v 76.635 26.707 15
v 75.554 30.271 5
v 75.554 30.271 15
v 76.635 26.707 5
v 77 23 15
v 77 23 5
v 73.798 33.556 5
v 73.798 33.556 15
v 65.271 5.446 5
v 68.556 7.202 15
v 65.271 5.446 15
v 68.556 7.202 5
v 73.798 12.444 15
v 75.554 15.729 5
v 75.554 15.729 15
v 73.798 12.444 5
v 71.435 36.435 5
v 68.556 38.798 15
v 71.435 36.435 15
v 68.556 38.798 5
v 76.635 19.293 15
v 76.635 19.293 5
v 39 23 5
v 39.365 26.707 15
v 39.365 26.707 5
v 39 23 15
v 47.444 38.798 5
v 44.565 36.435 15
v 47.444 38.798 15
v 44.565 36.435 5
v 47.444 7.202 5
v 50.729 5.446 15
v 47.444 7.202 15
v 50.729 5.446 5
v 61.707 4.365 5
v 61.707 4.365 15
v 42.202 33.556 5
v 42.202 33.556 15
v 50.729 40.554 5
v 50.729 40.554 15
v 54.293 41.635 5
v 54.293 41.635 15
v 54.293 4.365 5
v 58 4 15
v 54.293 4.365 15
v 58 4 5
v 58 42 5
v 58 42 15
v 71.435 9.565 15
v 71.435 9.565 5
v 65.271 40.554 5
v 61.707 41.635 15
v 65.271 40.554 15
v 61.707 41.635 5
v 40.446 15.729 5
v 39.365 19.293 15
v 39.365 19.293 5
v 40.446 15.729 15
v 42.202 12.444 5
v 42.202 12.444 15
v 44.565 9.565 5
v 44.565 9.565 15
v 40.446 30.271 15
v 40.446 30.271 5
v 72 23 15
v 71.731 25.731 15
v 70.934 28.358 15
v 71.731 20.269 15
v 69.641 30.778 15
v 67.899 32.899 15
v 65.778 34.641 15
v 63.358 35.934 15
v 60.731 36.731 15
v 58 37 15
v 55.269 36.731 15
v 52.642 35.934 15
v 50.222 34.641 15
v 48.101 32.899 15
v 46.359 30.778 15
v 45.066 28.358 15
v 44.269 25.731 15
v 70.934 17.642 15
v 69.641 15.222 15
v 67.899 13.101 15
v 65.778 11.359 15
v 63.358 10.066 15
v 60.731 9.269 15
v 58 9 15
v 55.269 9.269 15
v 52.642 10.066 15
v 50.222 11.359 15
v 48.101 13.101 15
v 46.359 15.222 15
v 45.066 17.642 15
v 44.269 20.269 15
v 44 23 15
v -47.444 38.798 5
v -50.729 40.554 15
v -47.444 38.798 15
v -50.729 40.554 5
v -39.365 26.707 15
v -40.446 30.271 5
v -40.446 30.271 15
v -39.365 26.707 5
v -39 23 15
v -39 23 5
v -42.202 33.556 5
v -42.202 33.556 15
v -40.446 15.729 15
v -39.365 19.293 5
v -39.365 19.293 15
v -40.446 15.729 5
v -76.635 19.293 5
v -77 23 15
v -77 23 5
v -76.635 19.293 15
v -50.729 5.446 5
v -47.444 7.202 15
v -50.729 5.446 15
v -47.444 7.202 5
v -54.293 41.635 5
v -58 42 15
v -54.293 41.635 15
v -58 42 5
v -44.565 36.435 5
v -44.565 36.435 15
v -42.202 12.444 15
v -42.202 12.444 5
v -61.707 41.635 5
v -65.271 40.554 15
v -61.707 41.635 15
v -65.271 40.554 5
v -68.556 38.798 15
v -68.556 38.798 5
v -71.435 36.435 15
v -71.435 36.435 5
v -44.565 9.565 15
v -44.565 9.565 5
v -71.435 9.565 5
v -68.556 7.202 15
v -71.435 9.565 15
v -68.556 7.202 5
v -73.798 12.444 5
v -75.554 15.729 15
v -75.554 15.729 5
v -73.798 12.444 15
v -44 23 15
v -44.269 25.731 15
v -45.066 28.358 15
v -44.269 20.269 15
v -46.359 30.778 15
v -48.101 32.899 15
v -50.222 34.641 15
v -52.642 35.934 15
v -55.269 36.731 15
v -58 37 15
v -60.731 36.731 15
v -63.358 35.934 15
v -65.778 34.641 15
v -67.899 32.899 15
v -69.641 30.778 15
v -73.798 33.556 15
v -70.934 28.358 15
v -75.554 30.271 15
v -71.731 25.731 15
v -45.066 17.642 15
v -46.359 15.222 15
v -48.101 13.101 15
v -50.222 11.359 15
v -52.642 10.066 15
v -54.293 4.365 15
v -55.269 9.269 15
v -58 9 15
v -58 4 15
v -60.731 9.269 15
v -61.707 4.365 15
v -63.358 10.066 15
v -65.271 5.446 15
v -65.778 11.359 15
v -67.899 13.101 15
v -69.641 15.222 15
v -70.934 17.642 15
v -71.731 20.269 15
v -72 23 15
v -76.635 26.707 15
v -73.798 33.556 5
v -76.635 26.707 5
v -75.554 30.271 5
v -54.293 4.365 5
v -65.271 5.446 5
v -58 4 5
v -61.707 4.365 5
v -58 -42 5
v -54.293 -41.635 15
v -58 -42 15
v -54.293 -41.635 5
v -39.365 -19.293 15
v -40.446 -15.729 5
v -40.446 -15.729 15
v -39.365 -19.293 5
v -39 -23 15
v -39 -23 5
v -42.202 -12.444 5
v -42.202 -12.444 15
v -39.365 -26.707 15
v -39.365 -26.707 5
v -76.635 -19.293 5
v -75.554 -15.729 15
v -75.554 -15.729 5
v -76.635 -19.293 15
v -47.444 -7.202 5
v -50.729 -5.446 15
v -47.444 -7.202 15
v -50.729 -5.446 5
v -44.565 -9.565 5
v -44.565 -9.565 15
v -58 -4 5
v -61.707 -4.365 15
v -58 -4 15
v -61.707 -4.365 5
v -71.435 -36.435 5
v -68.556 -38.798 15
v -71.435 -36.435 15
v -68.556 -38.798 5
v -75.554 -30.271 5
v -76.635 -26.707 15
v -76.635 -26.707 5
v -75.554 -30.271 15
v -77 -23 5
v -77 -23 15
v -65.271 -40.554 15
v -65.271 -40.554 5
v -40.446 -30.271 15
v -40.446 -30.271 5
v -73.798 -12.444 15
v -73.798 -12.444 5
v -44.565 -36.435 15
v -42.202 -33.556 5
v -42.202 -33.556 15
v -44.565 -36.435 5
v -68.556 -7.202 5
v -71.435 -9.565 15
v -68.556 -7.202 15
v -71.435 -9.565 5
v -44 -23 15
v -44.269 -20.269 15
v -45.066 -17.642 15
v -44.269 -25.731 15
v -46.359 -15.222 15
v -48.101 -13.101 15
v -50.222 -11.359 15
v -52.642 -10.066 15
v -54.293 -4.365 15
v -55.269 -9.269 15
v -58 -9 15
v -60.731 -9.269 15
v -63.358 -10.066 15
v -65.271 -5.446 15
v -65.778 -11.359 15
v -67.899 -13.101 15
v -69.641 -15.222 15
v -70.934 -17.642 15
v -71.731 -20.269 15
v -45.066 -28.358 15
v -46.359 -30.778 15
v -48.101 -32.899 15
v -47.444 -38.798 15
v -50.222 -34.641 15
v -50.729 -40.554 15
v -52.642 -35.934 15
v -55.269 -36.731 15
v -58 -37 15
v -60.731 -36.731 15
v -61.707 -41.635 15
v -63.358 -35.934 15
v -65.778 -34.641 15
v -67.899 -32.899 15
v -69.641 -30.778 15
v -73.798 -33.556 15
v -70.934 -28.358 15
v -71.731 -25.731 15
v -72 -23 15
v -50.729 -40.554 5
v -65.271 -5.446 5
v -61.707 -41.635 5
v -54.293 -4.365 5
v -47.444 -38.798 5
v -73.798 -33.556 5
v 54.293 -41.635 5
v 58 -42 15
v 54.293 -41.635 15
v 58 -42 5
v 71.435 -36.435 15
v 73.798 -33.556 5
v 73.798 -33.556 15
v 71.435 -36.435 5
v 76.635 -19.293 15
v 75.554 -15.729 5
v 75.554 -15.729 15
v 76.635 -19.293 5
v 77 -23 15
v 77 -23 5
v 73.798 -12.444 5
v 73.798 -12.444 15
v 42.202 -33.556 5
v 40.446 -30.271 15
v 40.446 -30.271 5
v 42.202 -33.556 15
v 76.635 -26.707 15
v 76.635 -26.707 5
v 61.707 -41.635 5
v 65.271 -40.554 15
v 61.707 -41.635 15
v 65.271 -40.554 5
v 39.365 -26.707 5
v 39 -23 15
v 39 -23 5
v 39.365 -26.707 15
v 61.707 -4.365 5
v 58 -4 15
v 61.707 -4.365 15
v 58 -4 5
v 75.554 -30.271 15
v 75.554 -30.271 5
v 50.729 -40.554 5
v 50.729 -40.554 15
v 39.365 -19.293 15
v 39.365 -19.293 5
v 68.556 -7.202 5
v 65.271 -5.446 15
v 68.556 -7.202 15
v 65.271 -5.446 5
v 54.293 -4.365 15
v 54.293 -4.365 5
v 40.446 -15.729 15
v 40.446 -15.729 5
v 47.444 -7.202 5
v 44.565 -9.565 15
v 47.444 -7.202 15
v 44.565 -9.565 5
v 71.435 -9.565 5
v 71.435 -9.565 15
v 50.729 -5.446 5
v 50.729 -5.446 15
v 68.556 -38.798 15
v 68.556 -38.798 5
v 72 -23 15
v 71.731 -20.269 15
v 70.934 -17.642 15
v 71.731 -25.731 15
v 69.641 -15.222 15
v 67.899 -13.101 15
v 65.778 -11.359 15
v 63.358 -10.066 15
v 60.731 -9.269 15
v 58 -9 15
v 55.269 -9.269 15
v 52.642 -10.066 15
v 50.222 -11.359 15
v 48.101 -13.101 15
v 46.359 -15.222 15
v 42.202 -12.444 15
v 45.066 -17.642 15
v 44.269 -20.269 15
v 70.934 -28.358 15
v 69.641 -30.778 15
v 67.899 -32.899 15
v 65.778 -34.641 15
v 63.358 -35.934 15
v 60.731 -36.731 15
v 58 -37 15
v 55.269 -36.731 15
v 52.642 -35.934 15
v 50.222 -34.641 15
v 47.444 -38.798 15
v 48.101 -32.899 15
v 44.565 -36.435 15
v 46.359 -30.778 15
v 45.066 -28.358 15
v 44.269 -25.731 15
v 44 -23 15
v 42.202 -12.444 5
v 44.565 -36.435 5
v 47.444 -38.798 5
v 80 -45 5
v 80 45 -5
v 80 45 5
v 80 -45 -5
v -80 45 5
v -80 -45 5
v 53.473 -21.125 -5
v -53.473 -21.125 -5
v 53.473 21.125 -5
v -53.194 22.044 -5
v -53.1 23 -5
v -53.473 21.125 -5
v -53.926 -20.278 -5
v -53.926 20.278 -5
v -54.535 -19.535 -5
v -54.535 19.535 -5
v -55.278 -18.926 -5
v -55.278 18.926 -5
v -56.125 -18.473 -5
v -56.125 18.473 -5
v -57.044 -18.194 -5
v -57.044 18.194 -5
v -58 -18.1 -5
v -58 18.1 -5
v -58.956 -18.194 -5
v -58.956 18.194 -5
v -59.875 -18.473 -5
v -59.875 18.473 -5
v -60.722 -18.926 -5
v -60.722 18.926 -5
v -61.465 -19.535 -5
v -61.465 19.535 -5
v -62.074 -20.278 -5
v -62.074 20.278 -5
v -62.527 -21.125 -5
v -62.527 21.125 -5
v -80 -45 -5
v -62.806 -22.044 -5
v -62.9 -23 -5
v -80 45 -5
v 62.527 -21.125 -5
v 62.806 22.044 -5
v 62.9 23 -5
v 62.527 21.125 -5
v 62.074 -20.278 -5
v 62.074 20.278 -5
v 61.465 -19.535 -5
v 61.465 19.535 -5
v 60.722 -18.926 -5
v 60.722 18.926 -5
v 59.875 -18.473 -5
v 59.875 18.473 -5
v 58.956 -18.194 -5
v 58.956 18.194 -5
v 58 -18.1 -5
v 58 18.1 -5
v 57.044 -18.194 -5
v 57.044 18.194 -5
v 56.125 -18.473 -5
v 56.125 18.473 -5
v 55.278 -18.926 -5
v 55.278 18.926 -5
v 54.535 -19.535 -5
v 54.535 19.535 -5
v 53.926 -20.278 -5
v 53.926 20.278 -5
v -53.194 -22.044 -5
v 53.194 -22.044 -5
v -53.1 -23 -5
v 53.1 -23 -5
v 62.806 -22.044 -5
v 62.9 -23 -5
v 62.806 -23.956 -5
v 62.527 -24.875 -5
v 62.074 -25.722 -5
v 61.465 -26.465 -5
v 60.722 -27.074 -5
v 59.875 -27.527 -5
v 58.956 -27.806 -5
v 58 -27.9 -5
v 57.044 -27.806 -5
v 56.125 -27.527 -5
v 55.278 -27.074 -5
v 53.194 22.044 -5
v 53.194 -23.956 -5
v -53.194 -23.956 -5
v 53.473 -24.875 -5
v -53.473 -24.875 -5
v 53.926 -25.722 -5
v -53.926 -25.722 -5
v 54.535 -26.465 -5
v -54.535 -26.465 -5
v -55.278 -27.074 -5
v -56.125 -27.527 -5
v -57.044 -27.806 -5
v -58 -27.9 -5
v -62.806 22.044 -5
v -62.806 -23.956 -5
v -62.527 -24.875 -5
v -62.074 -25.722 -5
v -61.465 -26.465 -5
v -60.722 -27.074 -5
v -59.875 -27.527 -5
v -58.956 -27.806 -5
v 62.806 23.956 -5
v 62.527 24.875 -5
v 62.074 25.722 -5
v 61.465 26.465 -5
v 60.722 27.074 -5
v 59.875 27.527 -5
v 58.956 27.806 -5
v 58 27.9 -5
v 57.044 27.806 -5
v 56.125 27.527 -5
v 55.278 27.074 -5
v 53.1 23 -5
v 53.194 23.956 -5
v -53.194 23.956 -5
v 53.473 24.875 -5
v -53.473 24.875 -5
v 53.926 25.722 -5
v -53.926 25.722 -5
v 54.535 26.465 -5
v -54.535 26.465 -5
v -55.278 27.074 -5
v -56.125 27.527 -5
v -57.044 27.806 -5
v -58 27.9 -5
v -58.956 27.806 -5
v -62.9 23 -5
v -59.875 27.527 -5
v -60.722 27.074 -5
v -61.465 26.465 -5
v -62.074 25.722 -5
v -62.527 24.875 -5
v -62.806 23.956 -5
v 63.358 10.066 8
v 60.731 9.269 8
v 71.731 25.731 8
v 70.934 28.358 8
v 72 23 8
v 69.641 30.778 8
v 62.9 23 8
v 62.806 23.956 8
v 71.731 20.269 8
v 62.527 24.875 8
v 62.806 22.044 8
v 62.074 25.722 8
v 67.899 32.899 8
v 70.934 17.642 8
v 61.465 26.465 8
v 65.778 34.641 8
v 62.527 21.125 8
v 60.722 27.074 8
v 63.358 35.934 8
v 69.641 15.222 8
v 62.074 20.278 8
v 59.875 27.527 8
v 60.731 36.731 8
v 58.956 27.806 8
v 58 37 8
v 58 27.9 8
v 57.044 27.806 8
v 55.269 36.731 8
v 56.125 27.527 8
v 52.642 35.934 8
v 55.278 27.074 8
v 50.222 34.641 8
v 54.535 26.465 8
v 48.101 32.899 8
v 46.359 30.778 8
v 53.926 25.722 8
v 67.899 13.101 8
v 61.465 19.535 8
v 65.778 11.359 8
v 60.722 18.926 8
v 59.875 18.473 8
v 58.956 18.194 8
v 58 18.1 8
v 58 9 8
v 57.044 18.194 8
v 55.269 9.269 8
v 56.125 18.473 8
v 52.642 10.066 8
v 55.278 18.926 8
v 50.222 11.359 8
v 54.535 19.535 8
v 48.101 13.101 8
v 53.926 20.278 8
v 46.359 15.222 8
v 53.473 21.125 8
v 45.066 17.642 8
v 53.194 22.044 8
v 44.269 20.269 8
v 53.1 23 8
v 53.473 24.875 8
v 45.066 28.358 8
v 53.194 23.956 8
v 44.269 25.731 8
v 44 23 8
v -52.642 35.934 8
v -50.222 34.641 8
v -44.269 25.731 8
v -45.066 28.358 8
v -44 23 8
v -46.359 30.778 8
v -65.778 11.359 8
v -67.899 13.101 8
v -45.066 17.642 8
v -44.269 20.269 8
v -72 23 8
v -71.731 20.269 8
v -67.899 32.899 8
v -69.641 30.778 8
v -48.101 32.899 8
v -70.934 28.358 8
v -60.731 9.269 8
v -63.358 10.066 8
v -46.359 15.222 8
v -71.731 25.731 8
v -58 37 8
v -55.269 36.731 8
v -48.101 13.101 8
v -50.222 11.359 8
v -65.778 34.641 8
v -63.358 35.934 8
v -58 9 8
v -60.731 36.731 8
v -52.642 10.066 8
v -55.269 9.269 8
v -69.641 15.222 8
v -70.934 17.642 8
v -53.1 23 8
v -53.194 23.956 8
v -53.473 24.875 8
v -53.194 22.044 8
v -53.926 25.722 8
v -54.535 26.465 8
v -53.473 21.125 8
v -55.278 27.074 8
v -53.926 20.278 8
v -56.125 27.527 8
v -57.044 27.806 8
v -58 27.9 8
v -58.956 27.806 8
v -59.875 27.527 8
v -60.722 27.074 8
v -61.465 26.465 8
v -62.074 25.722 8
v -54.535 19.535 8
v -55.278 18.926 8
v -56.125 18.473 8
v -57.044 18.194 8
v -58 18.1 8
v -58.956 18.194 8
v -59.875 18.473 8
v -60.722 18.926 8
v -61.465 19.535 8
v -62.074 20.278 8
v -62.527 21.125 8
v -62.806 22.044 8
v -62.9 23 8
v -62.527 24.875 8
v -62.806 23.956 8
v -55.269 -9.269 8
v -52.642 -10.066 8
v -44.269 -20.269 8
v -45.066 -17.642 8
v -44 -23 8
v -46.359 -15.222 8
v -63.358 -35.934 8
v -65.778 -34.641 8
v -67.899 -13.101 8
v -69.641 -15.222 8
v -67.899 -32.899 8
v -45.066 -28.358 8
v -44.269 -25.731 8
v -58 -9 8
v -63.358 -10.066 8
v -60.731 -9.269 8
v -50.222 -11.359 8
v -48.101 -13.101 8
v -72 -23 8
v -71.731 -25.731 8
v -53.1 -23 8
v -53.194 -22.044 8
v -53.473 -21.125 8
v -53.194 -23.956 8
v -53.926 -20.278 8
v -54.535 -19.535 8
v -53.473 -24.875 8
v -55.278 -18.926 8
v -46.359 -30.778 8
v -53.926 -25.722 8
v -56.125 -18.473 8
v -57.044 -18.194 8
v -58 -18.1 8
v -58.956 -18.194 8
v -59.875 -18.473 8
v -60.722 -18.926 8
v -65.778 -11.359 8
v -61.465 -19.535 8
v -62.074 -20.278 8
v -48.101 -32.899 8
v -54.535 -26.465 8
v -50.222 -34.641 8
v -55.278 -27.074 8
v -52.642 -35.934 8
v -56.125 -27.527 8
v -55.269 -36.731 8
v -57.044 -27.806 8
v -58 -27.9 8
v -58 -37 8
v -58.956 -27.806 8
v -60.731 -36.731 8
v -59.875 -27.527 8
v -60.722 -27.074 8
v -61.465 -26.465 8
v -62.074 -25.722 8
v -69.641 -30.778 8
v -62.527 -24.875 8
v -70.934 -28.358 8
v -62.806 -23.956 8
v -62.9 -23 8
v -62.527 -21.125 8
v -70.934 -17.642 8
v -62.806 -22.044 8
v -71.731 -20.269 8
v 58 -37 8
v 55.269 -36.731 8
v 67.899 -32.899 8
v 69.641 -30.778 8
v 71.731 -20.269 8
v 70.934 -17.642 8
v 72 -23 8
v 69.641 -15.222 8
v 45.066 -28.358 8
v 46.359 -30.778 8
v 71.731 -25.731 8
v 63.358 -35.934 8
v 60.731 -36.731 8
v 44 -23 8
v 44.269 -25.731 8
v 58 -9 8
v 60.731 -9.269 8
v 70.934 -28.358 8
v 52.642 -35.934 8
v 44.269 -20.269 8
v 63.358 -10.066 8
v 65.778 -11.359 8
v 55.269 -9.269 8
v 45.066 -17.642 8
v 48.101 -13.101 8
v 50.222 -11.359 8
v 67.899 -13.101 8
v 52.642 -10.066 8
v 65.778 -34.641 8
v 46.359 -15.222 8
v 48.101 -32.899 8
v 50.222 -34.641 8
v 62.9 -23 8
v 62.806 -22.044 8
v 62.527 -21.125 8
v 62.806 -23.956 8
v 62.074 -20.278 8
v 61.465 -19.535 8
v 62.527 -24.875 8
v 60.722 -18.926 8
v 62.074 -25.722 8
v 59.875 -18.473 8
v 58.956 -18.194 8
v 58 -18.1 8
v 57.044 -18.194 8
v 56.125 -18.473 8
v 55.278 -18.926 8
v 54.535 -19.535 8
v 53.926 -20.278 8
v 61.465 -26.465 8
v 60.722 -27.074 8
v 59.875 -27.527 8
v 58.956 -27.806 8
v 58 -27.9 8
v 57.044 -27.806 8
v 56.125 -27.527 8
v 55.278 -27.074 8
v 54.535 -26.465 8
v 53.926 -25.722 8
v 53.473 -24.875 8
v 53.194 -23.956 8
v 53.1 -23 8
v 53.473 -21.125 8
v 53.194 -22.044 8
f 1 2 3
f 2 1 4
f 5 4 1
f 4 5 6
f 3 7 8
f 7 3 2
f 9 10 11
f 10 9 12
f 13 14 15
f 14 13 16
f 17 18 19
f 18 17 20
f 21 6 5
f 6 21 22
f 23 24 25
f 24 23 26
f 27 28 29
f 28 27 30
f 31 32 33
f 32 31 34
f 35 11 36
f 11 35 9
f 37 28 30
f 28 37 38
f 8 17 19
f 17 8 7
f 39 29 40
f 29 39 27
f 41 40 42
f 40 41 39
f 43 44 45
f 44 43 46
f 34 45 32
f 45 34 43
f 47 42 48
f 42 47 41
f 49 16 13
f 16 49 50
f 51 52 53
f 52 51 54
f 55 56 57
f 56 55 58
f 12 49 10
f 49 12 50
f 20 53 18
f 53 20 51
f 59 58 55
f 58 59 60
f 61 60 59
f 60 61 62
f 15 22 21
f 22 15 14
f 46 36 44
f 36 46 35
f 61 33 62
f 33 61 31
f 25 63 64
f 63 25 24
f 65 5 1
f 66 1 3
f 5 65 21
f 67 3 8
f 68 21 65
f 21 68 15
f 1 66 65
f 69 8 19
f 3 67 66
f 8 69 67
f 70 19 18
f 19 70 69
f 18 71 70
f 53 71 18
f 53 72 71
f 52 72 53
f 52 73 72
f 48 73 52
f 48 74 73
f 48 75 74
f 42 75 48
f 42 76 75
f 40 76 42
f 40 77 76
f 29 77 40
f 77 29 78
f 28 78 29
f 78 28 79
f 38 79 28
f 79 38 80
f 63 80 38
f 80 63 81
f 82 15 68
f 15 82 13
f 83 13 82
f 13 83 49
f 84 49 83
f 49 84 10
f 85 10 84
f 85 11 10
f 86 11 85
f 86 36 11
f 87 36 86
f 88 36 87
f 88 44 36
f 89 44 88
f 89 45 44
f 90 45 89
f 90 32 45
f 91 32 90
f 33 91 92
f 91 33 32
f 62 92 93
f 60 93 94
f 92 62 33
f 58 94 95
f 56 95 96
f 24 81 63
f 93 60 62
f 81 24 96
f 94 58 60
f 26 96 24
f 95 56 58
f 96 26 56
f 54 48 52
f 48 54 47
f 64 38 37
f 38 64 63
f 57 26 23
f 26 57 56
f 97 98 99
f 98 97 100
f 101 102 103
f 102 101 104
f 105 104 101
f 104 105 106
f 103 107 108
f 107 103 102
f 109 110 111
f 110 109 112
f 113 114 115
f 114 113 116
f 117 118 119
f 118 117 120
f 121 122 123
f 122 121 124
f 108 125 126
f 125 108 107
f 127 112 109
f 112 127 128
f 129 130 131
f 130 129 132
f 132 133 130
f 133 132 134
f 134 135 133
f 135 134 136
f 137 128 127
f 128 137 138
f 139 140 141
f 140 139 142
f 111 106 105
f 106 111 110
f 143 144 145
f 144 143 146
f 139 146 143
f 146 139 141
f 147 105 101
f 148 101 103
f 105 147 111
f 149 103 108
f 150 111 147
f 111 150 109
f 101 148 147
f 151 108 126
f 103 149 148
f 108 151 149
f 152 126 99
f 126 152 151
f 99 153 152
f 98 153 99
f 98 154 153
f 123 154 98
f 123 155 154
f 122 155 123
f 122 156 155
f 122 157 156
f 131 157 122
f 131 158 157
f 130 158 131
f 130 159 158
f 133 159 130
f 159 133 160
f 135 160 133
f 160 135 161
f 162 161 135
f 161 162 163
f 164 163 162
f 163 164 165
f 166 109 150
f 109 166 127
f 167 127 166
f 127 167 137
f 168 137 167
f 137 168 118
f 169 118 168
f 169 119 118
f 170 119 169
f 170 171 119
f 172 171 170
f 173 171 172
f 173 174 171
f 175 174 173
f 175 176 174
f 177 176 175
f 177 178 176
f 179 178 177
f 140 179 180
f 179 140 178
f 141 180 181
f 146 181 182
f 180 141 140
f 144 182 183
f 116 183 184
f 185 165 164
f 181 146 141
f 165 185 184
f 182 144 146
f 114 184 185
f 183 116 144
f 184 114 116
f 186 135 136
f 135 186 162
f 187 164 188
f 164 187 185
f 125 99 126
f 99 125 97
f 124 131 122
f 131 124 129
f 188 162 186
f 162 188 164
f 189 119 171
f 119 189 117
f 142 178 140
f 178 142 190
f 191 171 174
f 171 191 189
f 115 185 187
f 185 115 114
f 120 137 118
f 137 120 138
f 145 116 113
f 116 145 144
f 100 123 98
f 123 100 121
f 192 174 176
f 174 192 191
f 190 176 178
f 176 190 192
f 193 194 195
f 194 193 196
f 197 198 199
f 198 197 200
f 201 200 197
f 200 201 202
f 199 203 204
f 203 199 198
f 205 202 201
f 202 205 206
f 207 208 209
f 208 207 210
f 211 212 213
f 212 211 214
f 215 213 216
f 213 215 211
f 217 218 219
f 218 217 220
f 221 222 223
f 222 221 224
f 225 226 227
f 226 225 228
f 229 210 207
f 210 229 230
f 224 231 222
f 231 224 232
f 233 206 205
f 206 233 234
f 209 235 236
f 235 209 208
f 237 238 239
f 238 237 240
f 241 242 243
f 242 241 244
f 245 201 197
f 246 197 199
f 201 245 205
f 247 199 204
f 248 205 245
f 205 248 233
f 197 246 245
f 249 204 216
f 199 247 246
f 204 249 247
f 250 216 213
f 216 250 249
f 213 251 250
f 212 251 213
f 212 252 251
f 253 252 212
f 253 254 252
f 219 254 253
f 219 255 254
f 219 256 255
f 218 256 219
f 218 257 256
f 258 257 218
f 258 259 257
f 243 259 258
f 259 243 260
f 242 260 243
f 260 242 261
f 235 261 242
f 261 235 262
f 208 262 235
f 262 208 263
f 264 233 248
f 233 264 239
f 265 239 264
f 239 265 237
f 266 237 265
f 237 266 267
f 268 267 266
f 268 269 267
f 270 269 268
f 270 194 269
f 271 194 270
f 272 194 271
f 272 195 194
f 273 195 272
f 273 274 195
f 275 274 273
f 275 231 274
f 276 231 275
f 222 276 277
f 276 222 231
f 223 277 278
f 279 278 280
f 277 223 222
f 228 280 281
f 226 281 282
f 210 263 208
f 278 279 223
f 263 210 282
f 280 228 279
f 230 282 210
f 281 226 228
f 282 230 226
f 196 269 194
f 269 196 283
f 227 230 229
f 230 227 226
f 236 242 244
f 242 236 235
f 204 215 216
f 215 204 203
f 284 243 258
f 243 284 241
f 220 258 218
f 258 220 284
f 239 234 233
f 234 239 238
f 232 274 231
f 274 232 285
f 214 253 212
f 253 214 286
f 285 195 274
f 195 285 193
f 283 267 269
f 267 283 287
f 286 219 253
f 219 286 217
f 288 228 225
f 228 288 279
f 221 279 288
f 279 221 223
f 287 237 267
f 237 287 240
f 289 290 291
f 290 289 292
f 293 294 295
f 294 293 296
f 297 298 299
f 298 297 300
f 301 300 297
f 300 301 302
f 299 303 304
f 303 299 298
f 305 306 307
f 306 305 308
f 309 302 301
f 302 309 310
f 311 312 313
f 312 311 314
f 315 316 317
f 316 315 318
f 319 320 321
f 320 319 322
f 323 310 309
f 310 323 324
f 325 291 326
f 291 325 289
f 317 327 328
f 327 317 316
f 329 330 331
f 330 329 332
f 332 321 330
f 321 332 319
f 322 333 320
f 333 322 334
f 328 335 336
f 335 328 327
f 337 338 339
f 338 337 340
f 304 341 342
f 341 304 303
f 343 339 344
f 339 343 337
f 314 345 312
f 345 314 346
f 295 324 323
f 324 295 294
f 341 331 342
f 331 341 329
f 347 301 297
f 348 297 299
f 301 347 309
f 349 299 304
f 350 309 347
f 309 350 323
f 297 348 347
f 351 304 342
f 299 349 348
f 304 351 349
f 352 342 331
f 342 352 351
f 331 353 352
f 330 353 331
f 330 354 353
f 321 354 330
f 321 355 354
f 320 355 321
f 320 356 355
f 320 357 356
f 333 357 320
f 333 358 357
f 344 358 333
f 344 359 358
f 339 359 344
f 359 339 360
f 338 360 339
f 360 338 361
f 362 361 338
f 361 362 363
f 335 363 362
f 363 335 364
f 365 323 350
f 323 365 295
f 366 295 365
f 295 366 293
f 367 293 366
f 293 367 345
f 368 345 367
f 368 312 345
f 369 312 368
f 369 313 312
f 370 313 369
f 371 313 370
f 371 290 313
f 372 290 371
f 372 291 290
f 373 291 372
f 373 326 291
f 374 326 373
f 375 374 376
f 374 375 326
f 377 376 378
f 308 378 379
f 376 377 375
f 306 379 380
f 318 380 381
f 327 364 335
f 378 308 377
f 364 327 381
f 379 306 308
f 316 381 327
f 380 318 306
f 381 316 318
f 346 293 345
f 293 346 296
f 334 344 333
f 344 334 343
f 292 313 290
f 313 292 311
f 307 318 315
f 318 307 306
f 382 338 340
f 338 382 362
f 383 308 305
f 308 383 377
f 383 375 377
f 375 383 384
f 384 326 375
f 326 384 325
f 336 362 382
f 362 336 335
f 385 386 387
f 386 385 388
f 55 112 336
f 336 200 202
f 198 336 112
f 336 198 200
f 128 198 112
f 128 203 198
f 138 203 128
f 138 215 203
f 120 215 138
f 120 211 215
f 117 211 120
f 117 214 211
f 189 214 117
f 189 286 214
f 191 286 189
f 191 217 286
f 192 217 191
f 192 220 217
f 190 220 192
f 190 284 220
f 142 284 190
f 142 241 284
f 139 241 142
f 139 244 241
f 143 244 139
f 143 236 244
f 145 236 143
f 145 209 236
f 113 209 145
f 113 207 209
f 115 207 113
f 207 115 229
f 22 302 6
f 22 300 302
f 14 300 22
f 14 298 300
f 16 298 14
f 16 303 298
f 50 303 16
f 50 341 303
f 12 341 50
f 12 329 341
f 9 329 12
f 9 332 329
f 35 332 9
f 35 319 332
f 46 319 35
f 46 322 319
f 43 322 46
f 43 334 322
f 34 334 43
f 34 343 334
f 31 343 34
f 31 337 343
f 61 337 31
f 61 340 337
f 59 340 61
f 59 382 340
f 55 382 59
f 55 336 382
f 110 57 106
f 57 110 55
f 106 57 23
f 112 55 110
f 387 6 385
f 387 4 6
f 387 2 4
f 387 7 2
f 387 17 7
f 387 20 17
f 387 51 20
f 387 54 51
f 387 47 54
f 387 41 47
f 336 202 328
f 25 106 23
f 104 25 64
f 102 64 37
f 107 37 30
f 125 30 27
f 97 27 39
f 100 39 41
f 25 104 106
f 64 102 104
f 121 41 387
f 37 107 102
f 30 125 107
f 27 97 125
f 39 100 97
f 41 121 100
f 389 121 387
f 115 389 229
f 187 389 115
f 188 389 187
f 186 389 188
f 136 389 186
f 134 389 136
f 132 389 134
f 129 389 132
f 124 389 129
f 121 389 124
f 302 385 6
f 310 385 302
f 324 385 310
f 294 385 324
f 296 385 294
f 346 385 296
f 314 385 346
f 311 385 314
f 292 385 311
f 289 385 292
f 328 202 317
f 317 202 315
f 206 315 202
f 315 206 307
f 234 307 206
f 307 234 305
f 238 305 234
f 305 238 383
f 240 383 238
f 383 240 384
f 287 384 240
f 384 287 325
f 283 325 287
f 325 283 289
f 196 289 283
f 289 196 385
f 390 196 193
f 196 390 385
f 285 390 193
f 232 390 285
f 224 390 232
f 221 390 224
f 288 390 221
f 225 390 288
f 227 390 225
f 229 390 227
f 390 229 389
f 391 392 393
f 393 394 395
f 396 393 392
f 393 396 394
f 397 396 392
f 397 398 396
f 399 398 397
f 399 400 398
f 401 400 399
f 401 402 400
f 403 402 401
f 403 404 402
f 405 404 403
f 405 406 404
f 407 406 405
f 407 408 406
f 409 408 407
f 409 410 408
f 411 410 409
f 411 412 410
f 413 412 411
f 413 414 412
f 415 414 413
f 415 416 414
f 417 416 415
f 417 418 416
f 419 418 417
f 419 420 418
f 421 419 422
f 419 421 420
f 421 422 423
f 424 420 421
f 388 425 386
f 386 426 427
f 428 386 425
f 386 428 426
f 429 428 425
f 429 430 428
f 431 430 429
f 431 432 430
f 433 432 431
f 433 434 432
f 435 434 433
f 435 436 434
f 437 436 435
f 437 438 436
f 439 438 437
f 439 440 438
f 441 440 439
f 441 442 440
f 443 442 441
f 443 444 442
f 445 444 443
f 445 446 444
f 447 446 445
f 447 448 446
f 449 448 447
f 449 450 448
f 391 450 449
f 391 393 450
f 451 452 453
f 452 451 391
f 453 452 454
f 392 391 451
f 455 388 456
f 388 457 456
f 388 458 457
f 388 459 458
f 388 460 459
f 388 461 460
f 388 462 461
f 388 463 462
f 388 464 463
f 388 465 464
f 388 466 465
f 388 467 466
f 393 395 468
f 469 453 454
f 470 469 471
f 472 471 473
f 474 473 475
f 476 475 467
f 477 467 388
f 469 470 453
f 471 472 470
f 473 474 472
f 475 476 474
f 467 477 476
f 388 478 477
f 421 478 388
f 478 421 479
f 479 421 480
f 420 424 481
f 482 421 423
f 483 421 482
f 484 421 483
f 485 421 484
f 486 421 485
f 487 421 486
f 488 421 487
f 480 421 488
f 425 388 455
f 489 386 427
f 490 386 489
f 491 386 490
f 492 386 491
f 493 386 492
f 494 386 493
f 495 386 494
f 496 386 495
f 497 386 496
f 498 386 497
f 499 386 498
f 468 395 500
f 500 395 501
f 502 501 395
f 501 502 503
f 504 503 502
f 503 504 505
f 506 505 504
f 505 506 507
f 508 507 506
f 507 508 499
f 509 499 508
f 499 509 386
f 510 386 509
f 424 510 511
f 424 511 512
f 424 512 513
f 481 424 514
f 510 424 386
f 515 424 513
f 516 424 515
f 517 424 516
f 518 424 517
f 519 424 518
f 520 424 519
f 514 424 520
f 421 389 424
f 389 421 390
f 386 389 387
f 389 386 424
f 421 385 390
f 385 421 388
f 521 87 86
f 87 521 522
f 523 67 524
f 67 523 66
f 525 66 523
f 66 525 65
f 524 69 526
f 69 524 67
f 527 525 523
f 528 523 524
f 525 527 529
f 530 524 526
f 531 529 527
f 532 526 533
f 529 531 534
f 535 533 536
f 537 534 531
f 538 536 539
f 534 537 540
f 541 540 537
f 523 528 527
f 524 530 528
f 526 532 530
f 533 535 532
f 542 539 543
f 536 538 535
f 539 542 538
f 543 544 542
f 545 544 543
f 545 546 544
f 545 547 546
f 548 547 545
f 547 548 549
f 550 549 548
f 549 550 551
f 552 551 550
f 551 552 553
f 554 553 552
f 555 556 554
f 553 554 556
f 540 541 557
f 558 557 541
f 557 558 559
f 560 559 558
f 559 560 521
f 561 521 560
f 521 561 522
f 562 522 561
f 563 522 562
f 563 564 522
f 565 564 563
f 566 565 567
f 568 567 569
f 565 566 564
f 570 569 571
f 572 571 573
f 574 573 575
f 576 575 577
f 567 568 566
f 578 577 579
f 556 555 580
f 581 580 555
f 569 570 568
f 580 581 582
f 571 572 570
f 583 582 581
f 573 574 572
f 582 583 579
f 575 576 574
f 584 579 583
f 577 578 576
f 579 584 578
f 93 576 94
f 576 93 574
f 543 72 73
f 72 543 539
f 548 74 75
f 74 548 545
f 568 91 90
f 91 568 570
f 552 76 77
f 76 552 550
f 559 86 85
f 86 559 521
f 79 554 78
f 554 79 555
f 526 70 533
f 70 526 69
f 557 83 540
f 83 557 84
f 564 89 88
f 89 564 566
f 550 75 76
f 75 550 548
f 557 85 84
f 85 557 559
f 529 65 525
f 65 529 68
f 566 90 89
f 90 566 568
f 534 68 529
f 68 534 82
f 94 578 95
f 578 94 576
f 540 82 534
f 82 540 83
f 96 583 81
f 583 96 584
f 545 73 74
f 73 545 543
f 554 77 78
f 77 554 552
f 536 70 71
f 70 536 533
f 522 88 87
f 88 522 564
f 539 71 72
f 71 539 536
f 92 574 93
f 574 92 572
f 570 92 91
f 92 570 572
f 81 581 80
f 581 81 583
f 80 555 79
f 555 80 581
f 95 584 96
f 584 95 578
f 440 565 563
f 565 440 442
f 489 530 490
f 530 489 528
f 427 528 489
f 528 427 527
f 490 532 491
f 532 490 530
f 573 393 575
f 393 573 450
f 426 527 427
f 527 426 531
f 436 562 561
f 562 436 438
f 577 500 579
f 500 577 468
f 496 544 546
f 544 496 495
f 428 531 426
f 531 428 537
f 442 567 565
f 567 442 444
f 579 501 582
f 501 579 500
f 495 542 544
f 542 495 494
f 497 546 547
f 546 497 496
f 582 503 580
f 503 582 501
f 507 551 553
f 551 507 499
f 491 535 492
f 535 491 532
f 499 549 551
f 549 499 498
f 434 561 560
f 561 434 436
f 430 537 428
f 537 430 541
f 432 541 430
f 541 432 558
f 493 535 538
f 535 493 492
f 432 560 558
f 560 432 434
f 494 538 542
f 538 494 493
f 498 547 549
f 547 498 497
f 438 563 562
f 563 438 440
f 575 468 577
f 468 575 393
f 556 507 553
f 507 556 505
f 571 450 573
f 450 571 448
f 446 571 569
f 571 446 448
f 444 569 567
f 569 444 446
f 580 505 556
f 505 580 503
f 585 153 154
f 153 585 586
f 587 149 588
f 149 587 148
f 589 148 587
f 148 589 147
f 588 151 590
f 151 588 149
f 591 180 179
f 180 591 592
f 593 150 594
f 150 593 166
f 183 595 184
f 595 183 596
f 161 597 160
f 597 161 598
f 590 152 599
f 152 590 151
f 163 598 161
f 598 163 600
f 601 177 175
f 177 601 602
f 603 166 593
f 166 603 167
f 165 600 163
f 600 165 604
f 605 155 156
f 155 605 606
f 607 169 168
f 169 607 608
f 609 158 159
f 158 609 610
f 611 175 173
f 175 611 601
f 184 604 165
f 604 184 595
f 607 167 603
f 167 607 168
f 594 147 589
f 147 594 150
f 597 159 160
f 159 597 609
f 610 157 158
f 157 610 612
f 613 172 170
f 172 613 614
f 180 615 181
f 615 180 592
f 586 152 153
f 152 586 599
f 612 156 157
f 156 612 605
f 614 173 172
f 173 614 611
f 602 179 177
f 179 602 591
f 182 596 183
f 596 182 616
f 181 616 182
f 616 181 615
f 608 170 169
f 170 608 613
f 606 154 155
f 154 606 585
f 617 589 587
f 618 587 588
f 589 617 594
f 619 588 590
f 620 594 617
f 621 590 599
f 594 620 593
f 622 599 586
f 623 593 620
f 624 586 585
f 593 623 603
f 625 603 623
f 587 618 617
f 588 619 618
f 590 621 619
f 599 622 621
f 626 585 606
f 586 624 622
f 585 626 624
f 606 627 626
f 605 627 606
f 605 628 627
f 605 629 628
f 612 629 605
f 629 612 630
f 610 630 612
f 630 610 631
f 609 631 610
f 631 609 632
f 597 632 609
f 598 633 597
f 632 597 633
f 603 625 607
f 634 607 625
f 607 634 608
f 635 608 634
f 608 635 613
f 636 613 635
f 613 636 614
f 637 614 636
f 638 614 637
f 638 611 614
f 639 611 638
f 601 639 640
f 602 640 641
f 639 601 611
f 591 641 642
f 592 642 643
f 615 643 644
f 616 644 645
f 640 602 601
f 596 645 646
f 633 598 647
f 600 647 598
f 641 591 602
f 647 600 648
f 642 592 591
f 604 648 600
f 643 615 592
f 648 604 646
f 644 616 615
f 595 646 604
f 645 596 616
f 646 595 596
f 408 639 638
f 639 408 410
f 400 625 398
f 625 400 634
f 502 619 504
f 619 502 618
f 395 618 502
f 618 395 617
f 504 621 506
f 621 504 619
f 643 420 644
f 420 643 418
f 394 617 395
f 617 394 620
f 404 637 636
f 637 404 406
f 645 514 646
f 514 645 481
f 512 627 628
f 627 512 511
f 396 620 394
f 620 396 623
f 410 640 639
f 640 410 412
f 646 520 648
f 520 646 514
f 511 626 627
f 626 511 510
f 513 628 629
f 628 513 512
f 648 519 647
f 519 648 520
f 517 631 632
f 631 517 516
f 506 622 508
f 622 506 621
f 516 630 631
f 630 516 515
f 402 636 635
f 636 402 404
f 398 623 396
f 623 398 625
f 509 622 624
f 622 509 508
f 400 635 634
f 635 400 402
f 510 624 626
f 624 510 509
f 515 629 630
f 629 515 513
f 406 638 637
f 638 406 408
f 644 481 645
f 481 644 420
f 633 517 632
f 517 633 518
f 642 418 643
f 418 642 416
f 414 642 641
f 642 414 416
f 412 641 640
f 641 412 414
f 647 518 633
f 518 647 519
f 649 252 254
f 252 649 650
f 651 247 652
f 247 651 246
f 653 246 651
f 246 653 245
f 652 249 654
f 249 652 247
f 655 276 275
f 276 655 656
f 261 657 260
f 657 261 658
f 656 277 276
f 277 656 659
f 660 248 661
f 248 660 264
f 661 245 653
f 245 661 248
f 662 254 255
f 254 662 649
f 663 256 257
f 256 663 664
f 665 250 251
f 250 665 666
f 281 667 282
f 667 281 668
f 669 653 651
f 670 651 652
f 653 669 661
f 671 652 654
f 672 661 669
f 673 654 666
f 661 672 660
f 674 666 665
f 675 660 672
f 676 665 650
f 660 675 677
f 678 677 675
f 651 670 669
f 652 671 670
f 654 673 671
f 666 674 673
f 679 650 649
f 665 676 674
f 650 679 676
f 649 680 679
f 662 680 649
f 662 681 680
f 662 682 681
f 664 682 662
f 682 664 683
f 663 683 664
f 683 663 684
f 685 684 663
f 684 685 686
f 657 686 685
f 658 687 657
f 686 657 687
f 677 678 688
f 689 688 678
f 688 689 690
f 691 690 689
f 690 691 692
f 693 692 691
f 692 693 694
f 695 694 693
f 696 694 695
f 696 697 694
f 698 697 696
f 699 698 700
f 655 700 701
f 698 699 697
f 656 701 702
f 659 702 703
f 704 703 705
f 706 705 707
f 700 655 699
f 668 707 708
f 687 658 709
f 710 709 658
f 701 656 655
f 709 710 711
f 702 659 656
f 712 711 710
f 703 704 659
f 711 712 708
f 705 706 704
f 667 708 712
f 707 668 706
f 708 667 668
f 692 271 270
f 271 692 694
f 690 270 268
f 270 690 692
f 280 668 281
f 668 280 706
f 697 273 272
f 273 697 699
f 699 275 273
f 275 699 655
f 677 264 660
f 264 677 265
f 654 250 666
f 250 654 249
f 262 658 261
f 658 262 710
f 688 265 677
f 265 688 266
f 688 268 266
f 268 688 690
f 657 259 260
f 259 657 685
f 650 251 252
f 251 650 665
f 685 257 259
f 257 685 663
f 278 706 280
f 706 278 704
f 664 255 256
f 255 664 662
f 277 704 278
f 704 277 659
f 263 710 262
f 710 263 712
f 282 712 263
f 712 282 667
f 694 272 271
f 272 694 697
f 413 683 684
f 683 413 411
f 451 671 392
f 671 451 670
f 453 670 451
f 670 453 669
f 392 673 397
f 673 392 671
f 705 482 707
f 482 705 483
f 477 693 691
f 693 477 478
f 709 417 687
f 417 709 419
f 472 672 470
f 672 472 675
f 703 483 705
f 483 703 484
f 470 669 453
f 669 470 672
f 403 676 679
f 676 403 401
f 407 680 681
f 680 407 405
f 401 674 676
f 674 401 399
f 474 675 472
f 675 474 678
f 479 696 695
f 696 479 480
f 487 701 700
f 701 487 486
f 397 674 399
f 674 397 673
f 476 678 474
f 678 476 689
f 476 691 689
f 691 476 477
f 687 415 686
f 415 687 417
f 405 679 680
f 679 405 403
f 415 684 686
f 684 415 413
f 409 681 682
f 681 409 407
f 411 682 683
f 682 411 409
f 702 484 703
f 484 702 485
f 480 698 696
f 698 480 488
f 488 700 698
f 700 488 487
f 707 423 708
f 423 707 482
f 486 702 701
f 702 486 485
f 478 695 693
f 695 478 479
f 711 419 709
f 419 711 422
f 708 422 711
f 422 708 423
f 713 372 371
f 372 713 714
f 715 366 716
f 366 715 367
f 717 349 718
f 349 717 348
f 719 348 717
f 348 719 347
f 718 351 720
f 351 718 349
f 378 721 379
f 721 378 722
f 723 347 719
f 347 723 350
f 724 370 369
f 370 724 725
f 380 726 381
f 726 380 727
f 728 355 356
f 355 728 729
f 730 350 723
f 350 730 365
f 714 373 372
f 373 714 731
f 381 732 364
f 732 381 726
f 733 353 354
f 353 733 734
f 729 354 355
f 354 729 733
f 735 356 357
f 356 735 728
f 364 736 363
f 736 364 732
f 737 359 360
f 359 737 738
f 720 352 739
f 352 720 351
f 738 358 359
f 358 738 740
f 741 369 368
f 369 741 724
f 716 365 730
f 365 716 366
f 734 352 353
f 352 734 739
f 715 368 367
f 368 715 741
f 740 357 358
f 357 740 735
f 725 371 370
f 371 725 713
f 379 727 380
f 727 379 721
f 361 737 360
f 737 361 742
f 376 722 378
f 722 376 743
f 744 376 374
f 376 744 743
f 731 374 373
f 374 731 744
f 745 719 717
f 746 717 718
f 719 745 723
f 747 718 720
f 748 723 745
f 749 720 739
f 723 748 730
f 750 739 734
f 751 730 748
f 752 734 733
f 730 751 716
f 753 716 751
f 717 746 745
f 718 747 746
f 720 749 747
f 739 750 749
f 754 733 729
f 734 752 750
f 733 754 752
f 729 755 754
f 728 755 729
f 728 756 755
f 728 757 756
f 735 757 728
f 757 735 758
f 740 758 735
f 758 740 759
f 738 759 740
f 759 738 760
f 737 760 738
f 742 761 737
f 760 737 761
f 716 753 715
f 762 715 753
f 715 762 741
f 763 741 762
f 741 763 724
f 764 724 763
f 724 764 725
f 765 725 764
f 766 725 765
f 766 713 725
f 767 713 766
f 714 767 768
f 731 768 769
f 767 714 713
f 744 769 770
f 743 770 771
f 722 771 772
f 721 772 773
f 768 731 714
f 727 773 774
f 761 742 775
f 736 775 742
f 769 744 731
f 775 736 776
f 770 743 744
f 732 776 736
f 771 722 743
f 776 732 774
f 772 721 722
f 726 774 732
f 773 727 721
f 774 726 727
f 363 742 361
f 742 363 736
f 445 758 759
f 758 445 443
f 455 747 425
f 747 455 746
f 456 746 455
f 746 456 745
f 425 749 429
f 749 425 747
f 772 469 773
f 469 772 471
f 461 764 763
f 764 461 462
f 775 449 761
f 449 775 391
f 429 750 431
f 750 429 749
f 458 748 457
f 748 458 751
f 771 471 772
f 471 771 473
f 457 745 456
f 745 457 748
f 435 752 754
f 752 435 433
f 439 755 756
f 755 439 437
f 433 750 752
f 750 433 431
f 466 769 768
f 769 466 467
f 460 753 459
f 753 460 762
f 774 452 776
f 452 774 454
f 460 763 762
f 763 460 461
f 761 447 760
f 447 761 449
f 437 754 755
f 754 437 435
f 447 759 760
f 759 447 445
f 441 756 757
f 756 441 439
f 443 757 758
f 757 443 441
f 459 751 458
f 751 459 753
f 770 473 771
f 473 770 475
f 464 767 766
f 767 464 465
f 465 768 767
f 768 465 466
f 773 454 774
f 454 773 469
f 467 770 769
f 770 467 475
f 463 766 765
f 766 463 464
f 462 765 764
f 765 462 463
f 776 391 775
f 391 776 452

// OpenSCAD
$fn = 32;

// ----------------------------------------------------------------------
// Socket pad plate
// bosses with counterbored sockets for the screws
// ----------------------------------------------------------------------

// --- parameters (mm) ---
base_t = 10;            // base plate thickness
boss_h = 10;            // boss height above the base plate
boss_d = 38;            // boss diameter
socket_d = 28;          // socket diameter
socket_depth = 7;       // socket depth from the boss face
bolt_d = 9.8;           // screw clearance hole through the socket floor
plate = [160, 90, 10];  // overall size (x, y, z)
edge = 22;              // boss centre offset from the plate edge
pads = 4;               // boss count, one per corner

// --- derived feature positions (mm) ---
height = base_t + boss_h;        // = 20   overall height of the part
corner_x = plate[0] / 2 - edge;  // = 58   boss centre X
corner_y = plate[1] / 2 - edge;  // = 23   boss centre Y
feature_centers = [
  [corner_x, corner_y],
  [-corner_x, corner_y],
  [-corner_x, -corner_y],
  [corner_x, -corner_y]
];   // boss centres: sockets, holes and the pads themselves are placed from here

// base plate, bosses on feature_centers, socket + through hole in each
difference() {
  union() {
    cube(plate, center = true);
    for (centre = feature_centers)
      translate([centre[0], centre[1], plate[2] / 2 - 1])
        cylinder(d = boss_d, h = boss_h + 1);
  }
  for (centre = feature_centers) {
    translate([centre[0], centre[1], plate[2] / 2 + boss_h - socket_depth])
      cylinder(d = socket_d, h = socket_depth + 1);
    translate([centre[0], centre[1], -height])
      cylinder(d = bolt_d, h = 2 * height + 2);  // through the socket floor
  }
}
